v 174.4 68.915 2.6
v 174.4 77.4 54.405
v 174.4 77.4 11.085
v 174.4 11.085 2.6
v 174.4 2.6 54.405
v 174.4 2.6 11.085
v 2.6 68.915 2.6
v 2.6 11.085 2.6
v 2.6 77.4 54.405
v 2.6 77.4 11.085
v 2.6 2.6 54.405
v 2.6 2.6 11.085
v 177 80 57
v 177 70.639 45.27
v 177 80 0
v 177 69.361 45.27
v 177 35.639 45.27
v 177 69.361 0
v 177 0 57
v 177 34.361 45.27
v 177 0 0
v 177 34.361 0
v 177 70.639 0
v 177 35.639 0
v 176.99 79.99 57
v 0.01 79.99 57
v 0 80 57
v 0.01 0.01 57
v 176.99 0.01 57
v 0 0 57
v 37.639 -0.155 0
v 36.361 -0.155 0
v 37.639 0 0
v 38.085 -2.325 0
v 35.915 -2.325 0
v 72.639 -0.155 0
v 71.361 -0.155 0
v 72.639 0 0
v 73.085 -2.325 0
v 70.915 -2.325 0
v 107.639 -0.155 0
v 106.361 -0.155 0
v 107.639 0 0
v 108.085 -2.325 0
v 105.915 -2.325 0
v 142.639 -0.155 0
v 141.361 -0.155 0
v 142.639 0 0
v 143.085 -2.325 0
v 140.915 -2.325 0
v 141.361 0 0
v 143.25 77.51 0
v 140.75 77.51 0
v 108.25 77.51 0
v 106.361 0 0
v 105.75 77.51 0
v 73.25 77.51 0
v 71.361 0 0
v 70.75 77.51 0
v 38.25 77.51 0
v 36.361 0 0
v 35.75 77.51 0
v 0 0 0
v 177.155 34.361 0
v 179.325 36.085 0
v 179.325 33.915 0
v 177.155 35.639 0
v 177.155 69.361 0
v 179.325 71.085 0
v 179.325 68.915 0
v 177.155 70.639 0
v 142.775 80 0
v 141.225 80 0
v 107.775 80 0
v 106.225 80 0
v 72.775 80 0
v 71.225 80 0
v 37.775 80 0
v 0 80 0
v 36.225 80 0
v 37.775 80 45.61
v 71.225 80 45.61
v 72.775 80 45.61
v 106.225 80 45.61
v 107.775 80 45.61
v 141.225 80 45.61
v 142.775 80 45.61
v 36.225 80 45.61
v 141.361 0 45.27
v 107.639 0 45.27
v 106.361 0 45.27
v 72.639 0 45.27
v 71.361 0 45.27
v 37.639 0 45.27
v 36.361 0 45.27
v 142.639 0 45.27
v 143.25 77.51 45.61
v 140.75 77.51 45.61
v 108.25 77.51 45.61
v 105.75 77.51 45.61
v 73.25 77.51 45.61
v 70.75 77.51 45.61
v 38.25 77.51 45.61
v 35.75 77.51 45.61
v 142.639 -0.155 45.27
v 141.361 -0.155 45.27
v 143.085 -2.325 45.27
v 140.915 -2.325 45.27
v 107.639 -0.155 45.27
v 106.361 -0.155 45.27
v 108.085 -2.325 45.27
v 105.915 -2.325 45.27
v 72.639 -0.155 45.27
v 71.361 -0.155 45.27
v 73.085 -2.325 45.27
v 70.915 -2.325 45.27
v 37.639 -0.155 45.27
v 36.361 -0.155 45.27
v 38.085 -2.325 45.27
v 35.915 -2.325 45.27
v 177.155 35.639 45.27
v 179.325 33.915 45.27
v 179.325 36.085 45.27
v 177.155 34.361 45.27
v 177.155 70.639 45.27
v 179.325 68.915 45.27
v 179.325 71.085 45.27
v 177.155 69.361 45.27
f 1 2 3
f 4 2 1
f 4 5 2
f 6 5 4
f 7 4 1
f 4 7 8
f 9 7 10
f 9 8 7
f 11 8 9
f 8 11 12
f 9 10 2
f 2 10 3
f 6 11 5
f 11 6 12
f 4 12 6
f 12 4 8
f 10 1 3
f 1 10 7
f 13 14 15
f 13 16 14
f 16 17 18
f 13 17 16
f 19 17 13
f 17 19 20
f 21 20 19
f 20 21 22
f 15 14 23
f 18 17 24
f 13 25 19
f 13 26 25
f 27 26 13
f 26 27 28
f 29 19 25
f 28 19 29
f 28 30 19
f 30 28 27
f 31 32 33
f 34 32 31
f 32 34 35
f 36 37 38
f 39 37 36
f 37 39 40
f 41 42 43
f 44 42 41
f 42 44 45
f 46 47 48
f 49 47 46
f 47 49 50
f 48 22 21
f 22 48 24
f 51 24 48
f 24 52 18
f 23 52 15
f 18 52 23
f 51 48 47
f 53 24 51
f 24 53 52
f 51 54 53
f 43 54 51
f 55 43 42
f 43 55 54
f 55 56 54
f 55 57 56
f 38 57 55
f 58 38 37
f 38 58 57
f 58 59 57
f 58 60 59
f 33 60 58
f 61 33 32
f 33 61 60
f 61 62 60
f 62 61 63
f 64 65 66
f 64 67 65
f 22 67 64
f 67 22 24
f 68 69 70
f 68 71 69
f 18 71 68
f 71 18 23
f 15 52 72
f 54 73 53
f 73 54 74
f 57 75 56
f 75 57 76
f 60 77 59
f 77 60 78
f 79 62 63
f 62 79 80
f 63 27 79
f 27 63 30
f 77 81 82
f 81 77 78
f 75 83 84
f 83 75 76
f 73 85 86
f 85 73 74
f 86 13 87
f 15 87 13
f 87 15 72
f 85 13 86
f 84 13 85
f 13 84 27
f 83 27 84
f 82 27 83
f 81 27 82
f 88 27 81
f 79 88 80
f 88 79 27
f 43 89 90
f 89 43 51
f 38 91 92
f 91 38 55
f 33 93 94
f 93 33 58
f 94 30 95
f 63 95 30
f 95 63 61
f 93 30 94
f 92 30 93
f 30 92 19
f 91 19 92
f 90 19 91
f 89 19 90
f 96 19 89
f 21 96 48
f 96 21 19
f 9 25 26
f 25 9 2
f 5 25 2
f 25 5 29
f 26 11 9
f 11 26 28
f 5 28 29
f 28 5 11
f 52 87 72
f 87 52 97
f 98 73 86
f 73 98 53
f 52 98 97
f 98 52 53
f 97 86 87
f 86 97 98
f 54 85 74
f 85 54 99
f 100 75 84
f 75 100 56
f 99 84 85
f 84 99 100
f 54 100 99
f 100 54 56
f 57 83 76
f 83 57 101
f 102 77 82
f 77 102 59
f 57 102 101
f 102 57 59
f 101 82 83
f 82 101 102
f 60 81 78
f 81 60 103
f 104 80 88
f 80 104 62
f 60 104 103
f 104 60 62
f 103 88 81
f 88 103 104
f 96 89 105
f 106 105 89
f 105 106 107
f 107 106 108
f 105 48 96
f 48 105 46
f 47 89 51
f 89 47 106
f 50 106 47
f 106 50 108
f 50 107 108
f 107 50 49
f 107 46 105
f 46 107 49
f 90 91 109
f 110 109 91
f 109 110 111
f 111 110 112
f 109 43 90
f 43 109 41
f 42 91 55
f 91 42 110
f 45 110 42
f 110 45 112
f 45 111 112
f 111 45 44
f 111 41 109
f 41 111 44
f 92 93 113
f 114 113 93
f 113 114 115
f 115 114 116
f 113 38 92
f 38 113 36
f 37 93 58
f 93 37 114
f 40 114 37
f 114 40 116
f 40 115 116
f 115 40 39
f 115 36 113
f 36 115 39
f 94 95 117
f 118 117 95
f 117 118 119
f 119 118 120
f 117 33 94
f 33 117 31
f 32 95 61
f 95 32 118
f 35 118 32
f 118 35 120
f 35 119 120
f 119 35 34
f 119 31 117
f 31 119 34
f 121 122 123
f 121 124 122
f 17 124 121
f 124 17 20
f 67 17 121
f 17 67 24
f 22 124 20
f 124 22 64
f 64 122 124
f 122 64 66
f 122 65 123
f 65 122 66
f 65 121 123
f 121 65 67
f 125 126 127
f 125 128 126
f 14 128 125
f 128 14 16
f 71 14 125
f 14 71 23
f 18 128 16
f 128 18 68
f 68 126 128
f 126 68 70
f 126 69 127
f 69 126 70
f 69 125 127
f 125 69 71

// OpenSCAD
/* [ dimensions of box (mm)] */
width=177;
depth=80;
height=57;
// How thick the wall should be (leave enough room for the groove
wall=2.6;//[1.0:0.1:10]

/* [Dimension of cutout on bottom to fit drawer sides] */
// a special slice to handle drawers with rounded edges
drawerSlope=19;
// to handle where the edge sticks out into the drawer
drawerLip=2;
// slanted bottom just on 2 sides to make it easier to get things out
bottomSlope=6;

/* [ dimensions of rabbit and grooves to join the boxes ] */
// the depth of the groove (shouldn't be larger than "wall" 
groove=2.5;
// the angle to make sure they do not pull apart
grooveAngle=11;
// this depends on the printer, makes the rabbit this much smaller than the groove
shrinkage=0.33;
// how far apart to place the rabbits and grooves
grooveSeparation=35;

/* [ customize each box, rabbits match grooves] */
cutoutBottomLeft=false;
cutoutBottomRight=false;

topRabbit=false;
topGroove=true;

bottomRabbit=true;
bottomGroove=false;

rightRabbit=true;
rightGroove=false;

leftRabbit=false;
leftGroove=false;

/* [Hidden] */
small=0.01;
numGroovesOnWidth=(width-(cutoutBottomLeft?drawerSlope:wall))/grooveSeparation;
numGroovesOnHeight=(depth-wall)/grooveSeparation;

module buildGroove(reduce=0)
{
    translate([reduce/2,reduce/2,-(reduce?0:small)])
    linear_extrude(height=height*.8-1*reduce+(reduce?0:2*small))
    {
        polygon([
        [0,0],
        [(groove-reduce/2)*sin(grooveAngle),groove-reduce],
        [(groove-reduce)-(groove-reduce/2)*sin(grooveAngle),groove-reduce],
        [groove-reduce,0]    
        ]);
        
        if (reduce>0)
        {
            translate([(groove-reduce/2)*sin(grooveAngle),groove-reduce-small])
            square([(groove-reduce)-(groove-reduce/2)*sin(grooveAngle)*2,reduce]);
        }
    }

}
//!buildGroove();

module endBoxBasic(reduce,endSlope=false)
{
    wid=width-reduce*2;
    dep=depth-reduce*2;
    hei=height-reduce+(reduce?small:0);
    slope=drawerSlope-reduce/(reduce?sqrt(2):1);
    difference()
    {
        cube([wid,dep,hei]);
        
        if (endSlope)
        {
            translate([0,wid,0])
            rotate([90,0,0])
            linear_extrude(height=wid+2*small)
            polygon([[-small,-small],
                      [slope+small+(reduce?reduce*sin(25):0),-small],
                      [slope+small,drawerLip],
                      [-small,slope+drawerLip]
            ]);
            
            translate([7,0,0])
            rotate([0,-7,0])
            translate([-5,-small,0])
            cube([5,dep+2*small,hei*2]);
        
        }        
    }
}
module endBox(endSlope)
{
    difference()
    {
        endBoxBasic(0,endSlope);
        
        translate([wall,wall,wall])
        difference()
        {
            endBoxBasic(wall,endSlope);
            
            // the slopes on the bottom of the container that run full width
            translate([-small+200/2,0,0])
            rotate([45,0,0])
            cube([200,2*bottomSlope,2*bottomSlope],center=true);
            
            translate([-small+200/2,depth-wall*2,0])
            rotate([45,0,0])
            cube([200,2*bottomSlope,2*bottomSlope],center=true);
        }
        
        translate([(width-2*wall)/2+wall,(depth-2*wall)/2+wall,height-2*wall])
        linear_extrude(height=2*wall+small, 
            scale=[width/(width-4*wall),depth/(depth-4*wall)])
        square([width-4*wall,depth-4*wall],center=true);
    }
}
difference()
{
    if ( !cutoutBottomRight)
    {
        endBox(cutoutBottomLeft);
    }
    else
    {
        translate([width,0,0])
        mirror([1,0,0])
        endBox(true);
    }
    
    if (topGroove)
    for(i=[1:numGroovesOnWidth])
    {
        translate([width-grooveSeparation*i-groove/2,depth-groove+small,0])
        buildGroove(0);
    }
    
    if (bottomGroove)
    for(i=[1:numGroovesOnWidth])
    {
        translate([width-grooveSeparation*i+groove/2,groove-small,0])
        rotate([0,0,180])
        buildGroove(0);
    }
    
    if (rightGroove)
    for(i=[1:numGroovesOnHeight])
    {
        translate([width-groove+small,grooveSeparation*i+groove/2,0])
        rotate([0,0,-90])
        buildGroove(0);
    }
    
    if (leftGroove)
    for(i=[1:numGroovesOnHeight])
    {
        translate([groove-small,grooveSeparation*i-groove/2,0])
        rotate([0,0,90])
        buildGroove(0);
    }
}


if (topRabbit)
    {
    for(i=[1:numGroovesOnWidth])
    {
        translate([width-grooveSeparation*i+groove/2,depth+groove-small,0])
        rotate([0,0,180])
        buildGroove(shrinkage);
    }
}
if (bottomRabbit)
    {
    for(i=[1: numGroovesOnWidth])
    {
        translate([width-grooveSeparation*i-groove/2,-groove+small,0])
        buildGroove(shrinkage);
    }
}
if (rightRabbit)
    {
    for(i=[1:numGroovesOnHeight])
    {
        translate([width+groove-small,grooveSeparation*i-groove/2,0])
        rotate([0,0,90])
        buildGroove(shrinkage);
    }
}
if (leftRabbit)
    {
    for(i=[1:numGroovesOnHeight])
    {
        translate([-groove+small,grooveSeparation*i+groove/2,0])
        rotate([0,0,-90])
        buildGroove(shrinkage);
    }
}
